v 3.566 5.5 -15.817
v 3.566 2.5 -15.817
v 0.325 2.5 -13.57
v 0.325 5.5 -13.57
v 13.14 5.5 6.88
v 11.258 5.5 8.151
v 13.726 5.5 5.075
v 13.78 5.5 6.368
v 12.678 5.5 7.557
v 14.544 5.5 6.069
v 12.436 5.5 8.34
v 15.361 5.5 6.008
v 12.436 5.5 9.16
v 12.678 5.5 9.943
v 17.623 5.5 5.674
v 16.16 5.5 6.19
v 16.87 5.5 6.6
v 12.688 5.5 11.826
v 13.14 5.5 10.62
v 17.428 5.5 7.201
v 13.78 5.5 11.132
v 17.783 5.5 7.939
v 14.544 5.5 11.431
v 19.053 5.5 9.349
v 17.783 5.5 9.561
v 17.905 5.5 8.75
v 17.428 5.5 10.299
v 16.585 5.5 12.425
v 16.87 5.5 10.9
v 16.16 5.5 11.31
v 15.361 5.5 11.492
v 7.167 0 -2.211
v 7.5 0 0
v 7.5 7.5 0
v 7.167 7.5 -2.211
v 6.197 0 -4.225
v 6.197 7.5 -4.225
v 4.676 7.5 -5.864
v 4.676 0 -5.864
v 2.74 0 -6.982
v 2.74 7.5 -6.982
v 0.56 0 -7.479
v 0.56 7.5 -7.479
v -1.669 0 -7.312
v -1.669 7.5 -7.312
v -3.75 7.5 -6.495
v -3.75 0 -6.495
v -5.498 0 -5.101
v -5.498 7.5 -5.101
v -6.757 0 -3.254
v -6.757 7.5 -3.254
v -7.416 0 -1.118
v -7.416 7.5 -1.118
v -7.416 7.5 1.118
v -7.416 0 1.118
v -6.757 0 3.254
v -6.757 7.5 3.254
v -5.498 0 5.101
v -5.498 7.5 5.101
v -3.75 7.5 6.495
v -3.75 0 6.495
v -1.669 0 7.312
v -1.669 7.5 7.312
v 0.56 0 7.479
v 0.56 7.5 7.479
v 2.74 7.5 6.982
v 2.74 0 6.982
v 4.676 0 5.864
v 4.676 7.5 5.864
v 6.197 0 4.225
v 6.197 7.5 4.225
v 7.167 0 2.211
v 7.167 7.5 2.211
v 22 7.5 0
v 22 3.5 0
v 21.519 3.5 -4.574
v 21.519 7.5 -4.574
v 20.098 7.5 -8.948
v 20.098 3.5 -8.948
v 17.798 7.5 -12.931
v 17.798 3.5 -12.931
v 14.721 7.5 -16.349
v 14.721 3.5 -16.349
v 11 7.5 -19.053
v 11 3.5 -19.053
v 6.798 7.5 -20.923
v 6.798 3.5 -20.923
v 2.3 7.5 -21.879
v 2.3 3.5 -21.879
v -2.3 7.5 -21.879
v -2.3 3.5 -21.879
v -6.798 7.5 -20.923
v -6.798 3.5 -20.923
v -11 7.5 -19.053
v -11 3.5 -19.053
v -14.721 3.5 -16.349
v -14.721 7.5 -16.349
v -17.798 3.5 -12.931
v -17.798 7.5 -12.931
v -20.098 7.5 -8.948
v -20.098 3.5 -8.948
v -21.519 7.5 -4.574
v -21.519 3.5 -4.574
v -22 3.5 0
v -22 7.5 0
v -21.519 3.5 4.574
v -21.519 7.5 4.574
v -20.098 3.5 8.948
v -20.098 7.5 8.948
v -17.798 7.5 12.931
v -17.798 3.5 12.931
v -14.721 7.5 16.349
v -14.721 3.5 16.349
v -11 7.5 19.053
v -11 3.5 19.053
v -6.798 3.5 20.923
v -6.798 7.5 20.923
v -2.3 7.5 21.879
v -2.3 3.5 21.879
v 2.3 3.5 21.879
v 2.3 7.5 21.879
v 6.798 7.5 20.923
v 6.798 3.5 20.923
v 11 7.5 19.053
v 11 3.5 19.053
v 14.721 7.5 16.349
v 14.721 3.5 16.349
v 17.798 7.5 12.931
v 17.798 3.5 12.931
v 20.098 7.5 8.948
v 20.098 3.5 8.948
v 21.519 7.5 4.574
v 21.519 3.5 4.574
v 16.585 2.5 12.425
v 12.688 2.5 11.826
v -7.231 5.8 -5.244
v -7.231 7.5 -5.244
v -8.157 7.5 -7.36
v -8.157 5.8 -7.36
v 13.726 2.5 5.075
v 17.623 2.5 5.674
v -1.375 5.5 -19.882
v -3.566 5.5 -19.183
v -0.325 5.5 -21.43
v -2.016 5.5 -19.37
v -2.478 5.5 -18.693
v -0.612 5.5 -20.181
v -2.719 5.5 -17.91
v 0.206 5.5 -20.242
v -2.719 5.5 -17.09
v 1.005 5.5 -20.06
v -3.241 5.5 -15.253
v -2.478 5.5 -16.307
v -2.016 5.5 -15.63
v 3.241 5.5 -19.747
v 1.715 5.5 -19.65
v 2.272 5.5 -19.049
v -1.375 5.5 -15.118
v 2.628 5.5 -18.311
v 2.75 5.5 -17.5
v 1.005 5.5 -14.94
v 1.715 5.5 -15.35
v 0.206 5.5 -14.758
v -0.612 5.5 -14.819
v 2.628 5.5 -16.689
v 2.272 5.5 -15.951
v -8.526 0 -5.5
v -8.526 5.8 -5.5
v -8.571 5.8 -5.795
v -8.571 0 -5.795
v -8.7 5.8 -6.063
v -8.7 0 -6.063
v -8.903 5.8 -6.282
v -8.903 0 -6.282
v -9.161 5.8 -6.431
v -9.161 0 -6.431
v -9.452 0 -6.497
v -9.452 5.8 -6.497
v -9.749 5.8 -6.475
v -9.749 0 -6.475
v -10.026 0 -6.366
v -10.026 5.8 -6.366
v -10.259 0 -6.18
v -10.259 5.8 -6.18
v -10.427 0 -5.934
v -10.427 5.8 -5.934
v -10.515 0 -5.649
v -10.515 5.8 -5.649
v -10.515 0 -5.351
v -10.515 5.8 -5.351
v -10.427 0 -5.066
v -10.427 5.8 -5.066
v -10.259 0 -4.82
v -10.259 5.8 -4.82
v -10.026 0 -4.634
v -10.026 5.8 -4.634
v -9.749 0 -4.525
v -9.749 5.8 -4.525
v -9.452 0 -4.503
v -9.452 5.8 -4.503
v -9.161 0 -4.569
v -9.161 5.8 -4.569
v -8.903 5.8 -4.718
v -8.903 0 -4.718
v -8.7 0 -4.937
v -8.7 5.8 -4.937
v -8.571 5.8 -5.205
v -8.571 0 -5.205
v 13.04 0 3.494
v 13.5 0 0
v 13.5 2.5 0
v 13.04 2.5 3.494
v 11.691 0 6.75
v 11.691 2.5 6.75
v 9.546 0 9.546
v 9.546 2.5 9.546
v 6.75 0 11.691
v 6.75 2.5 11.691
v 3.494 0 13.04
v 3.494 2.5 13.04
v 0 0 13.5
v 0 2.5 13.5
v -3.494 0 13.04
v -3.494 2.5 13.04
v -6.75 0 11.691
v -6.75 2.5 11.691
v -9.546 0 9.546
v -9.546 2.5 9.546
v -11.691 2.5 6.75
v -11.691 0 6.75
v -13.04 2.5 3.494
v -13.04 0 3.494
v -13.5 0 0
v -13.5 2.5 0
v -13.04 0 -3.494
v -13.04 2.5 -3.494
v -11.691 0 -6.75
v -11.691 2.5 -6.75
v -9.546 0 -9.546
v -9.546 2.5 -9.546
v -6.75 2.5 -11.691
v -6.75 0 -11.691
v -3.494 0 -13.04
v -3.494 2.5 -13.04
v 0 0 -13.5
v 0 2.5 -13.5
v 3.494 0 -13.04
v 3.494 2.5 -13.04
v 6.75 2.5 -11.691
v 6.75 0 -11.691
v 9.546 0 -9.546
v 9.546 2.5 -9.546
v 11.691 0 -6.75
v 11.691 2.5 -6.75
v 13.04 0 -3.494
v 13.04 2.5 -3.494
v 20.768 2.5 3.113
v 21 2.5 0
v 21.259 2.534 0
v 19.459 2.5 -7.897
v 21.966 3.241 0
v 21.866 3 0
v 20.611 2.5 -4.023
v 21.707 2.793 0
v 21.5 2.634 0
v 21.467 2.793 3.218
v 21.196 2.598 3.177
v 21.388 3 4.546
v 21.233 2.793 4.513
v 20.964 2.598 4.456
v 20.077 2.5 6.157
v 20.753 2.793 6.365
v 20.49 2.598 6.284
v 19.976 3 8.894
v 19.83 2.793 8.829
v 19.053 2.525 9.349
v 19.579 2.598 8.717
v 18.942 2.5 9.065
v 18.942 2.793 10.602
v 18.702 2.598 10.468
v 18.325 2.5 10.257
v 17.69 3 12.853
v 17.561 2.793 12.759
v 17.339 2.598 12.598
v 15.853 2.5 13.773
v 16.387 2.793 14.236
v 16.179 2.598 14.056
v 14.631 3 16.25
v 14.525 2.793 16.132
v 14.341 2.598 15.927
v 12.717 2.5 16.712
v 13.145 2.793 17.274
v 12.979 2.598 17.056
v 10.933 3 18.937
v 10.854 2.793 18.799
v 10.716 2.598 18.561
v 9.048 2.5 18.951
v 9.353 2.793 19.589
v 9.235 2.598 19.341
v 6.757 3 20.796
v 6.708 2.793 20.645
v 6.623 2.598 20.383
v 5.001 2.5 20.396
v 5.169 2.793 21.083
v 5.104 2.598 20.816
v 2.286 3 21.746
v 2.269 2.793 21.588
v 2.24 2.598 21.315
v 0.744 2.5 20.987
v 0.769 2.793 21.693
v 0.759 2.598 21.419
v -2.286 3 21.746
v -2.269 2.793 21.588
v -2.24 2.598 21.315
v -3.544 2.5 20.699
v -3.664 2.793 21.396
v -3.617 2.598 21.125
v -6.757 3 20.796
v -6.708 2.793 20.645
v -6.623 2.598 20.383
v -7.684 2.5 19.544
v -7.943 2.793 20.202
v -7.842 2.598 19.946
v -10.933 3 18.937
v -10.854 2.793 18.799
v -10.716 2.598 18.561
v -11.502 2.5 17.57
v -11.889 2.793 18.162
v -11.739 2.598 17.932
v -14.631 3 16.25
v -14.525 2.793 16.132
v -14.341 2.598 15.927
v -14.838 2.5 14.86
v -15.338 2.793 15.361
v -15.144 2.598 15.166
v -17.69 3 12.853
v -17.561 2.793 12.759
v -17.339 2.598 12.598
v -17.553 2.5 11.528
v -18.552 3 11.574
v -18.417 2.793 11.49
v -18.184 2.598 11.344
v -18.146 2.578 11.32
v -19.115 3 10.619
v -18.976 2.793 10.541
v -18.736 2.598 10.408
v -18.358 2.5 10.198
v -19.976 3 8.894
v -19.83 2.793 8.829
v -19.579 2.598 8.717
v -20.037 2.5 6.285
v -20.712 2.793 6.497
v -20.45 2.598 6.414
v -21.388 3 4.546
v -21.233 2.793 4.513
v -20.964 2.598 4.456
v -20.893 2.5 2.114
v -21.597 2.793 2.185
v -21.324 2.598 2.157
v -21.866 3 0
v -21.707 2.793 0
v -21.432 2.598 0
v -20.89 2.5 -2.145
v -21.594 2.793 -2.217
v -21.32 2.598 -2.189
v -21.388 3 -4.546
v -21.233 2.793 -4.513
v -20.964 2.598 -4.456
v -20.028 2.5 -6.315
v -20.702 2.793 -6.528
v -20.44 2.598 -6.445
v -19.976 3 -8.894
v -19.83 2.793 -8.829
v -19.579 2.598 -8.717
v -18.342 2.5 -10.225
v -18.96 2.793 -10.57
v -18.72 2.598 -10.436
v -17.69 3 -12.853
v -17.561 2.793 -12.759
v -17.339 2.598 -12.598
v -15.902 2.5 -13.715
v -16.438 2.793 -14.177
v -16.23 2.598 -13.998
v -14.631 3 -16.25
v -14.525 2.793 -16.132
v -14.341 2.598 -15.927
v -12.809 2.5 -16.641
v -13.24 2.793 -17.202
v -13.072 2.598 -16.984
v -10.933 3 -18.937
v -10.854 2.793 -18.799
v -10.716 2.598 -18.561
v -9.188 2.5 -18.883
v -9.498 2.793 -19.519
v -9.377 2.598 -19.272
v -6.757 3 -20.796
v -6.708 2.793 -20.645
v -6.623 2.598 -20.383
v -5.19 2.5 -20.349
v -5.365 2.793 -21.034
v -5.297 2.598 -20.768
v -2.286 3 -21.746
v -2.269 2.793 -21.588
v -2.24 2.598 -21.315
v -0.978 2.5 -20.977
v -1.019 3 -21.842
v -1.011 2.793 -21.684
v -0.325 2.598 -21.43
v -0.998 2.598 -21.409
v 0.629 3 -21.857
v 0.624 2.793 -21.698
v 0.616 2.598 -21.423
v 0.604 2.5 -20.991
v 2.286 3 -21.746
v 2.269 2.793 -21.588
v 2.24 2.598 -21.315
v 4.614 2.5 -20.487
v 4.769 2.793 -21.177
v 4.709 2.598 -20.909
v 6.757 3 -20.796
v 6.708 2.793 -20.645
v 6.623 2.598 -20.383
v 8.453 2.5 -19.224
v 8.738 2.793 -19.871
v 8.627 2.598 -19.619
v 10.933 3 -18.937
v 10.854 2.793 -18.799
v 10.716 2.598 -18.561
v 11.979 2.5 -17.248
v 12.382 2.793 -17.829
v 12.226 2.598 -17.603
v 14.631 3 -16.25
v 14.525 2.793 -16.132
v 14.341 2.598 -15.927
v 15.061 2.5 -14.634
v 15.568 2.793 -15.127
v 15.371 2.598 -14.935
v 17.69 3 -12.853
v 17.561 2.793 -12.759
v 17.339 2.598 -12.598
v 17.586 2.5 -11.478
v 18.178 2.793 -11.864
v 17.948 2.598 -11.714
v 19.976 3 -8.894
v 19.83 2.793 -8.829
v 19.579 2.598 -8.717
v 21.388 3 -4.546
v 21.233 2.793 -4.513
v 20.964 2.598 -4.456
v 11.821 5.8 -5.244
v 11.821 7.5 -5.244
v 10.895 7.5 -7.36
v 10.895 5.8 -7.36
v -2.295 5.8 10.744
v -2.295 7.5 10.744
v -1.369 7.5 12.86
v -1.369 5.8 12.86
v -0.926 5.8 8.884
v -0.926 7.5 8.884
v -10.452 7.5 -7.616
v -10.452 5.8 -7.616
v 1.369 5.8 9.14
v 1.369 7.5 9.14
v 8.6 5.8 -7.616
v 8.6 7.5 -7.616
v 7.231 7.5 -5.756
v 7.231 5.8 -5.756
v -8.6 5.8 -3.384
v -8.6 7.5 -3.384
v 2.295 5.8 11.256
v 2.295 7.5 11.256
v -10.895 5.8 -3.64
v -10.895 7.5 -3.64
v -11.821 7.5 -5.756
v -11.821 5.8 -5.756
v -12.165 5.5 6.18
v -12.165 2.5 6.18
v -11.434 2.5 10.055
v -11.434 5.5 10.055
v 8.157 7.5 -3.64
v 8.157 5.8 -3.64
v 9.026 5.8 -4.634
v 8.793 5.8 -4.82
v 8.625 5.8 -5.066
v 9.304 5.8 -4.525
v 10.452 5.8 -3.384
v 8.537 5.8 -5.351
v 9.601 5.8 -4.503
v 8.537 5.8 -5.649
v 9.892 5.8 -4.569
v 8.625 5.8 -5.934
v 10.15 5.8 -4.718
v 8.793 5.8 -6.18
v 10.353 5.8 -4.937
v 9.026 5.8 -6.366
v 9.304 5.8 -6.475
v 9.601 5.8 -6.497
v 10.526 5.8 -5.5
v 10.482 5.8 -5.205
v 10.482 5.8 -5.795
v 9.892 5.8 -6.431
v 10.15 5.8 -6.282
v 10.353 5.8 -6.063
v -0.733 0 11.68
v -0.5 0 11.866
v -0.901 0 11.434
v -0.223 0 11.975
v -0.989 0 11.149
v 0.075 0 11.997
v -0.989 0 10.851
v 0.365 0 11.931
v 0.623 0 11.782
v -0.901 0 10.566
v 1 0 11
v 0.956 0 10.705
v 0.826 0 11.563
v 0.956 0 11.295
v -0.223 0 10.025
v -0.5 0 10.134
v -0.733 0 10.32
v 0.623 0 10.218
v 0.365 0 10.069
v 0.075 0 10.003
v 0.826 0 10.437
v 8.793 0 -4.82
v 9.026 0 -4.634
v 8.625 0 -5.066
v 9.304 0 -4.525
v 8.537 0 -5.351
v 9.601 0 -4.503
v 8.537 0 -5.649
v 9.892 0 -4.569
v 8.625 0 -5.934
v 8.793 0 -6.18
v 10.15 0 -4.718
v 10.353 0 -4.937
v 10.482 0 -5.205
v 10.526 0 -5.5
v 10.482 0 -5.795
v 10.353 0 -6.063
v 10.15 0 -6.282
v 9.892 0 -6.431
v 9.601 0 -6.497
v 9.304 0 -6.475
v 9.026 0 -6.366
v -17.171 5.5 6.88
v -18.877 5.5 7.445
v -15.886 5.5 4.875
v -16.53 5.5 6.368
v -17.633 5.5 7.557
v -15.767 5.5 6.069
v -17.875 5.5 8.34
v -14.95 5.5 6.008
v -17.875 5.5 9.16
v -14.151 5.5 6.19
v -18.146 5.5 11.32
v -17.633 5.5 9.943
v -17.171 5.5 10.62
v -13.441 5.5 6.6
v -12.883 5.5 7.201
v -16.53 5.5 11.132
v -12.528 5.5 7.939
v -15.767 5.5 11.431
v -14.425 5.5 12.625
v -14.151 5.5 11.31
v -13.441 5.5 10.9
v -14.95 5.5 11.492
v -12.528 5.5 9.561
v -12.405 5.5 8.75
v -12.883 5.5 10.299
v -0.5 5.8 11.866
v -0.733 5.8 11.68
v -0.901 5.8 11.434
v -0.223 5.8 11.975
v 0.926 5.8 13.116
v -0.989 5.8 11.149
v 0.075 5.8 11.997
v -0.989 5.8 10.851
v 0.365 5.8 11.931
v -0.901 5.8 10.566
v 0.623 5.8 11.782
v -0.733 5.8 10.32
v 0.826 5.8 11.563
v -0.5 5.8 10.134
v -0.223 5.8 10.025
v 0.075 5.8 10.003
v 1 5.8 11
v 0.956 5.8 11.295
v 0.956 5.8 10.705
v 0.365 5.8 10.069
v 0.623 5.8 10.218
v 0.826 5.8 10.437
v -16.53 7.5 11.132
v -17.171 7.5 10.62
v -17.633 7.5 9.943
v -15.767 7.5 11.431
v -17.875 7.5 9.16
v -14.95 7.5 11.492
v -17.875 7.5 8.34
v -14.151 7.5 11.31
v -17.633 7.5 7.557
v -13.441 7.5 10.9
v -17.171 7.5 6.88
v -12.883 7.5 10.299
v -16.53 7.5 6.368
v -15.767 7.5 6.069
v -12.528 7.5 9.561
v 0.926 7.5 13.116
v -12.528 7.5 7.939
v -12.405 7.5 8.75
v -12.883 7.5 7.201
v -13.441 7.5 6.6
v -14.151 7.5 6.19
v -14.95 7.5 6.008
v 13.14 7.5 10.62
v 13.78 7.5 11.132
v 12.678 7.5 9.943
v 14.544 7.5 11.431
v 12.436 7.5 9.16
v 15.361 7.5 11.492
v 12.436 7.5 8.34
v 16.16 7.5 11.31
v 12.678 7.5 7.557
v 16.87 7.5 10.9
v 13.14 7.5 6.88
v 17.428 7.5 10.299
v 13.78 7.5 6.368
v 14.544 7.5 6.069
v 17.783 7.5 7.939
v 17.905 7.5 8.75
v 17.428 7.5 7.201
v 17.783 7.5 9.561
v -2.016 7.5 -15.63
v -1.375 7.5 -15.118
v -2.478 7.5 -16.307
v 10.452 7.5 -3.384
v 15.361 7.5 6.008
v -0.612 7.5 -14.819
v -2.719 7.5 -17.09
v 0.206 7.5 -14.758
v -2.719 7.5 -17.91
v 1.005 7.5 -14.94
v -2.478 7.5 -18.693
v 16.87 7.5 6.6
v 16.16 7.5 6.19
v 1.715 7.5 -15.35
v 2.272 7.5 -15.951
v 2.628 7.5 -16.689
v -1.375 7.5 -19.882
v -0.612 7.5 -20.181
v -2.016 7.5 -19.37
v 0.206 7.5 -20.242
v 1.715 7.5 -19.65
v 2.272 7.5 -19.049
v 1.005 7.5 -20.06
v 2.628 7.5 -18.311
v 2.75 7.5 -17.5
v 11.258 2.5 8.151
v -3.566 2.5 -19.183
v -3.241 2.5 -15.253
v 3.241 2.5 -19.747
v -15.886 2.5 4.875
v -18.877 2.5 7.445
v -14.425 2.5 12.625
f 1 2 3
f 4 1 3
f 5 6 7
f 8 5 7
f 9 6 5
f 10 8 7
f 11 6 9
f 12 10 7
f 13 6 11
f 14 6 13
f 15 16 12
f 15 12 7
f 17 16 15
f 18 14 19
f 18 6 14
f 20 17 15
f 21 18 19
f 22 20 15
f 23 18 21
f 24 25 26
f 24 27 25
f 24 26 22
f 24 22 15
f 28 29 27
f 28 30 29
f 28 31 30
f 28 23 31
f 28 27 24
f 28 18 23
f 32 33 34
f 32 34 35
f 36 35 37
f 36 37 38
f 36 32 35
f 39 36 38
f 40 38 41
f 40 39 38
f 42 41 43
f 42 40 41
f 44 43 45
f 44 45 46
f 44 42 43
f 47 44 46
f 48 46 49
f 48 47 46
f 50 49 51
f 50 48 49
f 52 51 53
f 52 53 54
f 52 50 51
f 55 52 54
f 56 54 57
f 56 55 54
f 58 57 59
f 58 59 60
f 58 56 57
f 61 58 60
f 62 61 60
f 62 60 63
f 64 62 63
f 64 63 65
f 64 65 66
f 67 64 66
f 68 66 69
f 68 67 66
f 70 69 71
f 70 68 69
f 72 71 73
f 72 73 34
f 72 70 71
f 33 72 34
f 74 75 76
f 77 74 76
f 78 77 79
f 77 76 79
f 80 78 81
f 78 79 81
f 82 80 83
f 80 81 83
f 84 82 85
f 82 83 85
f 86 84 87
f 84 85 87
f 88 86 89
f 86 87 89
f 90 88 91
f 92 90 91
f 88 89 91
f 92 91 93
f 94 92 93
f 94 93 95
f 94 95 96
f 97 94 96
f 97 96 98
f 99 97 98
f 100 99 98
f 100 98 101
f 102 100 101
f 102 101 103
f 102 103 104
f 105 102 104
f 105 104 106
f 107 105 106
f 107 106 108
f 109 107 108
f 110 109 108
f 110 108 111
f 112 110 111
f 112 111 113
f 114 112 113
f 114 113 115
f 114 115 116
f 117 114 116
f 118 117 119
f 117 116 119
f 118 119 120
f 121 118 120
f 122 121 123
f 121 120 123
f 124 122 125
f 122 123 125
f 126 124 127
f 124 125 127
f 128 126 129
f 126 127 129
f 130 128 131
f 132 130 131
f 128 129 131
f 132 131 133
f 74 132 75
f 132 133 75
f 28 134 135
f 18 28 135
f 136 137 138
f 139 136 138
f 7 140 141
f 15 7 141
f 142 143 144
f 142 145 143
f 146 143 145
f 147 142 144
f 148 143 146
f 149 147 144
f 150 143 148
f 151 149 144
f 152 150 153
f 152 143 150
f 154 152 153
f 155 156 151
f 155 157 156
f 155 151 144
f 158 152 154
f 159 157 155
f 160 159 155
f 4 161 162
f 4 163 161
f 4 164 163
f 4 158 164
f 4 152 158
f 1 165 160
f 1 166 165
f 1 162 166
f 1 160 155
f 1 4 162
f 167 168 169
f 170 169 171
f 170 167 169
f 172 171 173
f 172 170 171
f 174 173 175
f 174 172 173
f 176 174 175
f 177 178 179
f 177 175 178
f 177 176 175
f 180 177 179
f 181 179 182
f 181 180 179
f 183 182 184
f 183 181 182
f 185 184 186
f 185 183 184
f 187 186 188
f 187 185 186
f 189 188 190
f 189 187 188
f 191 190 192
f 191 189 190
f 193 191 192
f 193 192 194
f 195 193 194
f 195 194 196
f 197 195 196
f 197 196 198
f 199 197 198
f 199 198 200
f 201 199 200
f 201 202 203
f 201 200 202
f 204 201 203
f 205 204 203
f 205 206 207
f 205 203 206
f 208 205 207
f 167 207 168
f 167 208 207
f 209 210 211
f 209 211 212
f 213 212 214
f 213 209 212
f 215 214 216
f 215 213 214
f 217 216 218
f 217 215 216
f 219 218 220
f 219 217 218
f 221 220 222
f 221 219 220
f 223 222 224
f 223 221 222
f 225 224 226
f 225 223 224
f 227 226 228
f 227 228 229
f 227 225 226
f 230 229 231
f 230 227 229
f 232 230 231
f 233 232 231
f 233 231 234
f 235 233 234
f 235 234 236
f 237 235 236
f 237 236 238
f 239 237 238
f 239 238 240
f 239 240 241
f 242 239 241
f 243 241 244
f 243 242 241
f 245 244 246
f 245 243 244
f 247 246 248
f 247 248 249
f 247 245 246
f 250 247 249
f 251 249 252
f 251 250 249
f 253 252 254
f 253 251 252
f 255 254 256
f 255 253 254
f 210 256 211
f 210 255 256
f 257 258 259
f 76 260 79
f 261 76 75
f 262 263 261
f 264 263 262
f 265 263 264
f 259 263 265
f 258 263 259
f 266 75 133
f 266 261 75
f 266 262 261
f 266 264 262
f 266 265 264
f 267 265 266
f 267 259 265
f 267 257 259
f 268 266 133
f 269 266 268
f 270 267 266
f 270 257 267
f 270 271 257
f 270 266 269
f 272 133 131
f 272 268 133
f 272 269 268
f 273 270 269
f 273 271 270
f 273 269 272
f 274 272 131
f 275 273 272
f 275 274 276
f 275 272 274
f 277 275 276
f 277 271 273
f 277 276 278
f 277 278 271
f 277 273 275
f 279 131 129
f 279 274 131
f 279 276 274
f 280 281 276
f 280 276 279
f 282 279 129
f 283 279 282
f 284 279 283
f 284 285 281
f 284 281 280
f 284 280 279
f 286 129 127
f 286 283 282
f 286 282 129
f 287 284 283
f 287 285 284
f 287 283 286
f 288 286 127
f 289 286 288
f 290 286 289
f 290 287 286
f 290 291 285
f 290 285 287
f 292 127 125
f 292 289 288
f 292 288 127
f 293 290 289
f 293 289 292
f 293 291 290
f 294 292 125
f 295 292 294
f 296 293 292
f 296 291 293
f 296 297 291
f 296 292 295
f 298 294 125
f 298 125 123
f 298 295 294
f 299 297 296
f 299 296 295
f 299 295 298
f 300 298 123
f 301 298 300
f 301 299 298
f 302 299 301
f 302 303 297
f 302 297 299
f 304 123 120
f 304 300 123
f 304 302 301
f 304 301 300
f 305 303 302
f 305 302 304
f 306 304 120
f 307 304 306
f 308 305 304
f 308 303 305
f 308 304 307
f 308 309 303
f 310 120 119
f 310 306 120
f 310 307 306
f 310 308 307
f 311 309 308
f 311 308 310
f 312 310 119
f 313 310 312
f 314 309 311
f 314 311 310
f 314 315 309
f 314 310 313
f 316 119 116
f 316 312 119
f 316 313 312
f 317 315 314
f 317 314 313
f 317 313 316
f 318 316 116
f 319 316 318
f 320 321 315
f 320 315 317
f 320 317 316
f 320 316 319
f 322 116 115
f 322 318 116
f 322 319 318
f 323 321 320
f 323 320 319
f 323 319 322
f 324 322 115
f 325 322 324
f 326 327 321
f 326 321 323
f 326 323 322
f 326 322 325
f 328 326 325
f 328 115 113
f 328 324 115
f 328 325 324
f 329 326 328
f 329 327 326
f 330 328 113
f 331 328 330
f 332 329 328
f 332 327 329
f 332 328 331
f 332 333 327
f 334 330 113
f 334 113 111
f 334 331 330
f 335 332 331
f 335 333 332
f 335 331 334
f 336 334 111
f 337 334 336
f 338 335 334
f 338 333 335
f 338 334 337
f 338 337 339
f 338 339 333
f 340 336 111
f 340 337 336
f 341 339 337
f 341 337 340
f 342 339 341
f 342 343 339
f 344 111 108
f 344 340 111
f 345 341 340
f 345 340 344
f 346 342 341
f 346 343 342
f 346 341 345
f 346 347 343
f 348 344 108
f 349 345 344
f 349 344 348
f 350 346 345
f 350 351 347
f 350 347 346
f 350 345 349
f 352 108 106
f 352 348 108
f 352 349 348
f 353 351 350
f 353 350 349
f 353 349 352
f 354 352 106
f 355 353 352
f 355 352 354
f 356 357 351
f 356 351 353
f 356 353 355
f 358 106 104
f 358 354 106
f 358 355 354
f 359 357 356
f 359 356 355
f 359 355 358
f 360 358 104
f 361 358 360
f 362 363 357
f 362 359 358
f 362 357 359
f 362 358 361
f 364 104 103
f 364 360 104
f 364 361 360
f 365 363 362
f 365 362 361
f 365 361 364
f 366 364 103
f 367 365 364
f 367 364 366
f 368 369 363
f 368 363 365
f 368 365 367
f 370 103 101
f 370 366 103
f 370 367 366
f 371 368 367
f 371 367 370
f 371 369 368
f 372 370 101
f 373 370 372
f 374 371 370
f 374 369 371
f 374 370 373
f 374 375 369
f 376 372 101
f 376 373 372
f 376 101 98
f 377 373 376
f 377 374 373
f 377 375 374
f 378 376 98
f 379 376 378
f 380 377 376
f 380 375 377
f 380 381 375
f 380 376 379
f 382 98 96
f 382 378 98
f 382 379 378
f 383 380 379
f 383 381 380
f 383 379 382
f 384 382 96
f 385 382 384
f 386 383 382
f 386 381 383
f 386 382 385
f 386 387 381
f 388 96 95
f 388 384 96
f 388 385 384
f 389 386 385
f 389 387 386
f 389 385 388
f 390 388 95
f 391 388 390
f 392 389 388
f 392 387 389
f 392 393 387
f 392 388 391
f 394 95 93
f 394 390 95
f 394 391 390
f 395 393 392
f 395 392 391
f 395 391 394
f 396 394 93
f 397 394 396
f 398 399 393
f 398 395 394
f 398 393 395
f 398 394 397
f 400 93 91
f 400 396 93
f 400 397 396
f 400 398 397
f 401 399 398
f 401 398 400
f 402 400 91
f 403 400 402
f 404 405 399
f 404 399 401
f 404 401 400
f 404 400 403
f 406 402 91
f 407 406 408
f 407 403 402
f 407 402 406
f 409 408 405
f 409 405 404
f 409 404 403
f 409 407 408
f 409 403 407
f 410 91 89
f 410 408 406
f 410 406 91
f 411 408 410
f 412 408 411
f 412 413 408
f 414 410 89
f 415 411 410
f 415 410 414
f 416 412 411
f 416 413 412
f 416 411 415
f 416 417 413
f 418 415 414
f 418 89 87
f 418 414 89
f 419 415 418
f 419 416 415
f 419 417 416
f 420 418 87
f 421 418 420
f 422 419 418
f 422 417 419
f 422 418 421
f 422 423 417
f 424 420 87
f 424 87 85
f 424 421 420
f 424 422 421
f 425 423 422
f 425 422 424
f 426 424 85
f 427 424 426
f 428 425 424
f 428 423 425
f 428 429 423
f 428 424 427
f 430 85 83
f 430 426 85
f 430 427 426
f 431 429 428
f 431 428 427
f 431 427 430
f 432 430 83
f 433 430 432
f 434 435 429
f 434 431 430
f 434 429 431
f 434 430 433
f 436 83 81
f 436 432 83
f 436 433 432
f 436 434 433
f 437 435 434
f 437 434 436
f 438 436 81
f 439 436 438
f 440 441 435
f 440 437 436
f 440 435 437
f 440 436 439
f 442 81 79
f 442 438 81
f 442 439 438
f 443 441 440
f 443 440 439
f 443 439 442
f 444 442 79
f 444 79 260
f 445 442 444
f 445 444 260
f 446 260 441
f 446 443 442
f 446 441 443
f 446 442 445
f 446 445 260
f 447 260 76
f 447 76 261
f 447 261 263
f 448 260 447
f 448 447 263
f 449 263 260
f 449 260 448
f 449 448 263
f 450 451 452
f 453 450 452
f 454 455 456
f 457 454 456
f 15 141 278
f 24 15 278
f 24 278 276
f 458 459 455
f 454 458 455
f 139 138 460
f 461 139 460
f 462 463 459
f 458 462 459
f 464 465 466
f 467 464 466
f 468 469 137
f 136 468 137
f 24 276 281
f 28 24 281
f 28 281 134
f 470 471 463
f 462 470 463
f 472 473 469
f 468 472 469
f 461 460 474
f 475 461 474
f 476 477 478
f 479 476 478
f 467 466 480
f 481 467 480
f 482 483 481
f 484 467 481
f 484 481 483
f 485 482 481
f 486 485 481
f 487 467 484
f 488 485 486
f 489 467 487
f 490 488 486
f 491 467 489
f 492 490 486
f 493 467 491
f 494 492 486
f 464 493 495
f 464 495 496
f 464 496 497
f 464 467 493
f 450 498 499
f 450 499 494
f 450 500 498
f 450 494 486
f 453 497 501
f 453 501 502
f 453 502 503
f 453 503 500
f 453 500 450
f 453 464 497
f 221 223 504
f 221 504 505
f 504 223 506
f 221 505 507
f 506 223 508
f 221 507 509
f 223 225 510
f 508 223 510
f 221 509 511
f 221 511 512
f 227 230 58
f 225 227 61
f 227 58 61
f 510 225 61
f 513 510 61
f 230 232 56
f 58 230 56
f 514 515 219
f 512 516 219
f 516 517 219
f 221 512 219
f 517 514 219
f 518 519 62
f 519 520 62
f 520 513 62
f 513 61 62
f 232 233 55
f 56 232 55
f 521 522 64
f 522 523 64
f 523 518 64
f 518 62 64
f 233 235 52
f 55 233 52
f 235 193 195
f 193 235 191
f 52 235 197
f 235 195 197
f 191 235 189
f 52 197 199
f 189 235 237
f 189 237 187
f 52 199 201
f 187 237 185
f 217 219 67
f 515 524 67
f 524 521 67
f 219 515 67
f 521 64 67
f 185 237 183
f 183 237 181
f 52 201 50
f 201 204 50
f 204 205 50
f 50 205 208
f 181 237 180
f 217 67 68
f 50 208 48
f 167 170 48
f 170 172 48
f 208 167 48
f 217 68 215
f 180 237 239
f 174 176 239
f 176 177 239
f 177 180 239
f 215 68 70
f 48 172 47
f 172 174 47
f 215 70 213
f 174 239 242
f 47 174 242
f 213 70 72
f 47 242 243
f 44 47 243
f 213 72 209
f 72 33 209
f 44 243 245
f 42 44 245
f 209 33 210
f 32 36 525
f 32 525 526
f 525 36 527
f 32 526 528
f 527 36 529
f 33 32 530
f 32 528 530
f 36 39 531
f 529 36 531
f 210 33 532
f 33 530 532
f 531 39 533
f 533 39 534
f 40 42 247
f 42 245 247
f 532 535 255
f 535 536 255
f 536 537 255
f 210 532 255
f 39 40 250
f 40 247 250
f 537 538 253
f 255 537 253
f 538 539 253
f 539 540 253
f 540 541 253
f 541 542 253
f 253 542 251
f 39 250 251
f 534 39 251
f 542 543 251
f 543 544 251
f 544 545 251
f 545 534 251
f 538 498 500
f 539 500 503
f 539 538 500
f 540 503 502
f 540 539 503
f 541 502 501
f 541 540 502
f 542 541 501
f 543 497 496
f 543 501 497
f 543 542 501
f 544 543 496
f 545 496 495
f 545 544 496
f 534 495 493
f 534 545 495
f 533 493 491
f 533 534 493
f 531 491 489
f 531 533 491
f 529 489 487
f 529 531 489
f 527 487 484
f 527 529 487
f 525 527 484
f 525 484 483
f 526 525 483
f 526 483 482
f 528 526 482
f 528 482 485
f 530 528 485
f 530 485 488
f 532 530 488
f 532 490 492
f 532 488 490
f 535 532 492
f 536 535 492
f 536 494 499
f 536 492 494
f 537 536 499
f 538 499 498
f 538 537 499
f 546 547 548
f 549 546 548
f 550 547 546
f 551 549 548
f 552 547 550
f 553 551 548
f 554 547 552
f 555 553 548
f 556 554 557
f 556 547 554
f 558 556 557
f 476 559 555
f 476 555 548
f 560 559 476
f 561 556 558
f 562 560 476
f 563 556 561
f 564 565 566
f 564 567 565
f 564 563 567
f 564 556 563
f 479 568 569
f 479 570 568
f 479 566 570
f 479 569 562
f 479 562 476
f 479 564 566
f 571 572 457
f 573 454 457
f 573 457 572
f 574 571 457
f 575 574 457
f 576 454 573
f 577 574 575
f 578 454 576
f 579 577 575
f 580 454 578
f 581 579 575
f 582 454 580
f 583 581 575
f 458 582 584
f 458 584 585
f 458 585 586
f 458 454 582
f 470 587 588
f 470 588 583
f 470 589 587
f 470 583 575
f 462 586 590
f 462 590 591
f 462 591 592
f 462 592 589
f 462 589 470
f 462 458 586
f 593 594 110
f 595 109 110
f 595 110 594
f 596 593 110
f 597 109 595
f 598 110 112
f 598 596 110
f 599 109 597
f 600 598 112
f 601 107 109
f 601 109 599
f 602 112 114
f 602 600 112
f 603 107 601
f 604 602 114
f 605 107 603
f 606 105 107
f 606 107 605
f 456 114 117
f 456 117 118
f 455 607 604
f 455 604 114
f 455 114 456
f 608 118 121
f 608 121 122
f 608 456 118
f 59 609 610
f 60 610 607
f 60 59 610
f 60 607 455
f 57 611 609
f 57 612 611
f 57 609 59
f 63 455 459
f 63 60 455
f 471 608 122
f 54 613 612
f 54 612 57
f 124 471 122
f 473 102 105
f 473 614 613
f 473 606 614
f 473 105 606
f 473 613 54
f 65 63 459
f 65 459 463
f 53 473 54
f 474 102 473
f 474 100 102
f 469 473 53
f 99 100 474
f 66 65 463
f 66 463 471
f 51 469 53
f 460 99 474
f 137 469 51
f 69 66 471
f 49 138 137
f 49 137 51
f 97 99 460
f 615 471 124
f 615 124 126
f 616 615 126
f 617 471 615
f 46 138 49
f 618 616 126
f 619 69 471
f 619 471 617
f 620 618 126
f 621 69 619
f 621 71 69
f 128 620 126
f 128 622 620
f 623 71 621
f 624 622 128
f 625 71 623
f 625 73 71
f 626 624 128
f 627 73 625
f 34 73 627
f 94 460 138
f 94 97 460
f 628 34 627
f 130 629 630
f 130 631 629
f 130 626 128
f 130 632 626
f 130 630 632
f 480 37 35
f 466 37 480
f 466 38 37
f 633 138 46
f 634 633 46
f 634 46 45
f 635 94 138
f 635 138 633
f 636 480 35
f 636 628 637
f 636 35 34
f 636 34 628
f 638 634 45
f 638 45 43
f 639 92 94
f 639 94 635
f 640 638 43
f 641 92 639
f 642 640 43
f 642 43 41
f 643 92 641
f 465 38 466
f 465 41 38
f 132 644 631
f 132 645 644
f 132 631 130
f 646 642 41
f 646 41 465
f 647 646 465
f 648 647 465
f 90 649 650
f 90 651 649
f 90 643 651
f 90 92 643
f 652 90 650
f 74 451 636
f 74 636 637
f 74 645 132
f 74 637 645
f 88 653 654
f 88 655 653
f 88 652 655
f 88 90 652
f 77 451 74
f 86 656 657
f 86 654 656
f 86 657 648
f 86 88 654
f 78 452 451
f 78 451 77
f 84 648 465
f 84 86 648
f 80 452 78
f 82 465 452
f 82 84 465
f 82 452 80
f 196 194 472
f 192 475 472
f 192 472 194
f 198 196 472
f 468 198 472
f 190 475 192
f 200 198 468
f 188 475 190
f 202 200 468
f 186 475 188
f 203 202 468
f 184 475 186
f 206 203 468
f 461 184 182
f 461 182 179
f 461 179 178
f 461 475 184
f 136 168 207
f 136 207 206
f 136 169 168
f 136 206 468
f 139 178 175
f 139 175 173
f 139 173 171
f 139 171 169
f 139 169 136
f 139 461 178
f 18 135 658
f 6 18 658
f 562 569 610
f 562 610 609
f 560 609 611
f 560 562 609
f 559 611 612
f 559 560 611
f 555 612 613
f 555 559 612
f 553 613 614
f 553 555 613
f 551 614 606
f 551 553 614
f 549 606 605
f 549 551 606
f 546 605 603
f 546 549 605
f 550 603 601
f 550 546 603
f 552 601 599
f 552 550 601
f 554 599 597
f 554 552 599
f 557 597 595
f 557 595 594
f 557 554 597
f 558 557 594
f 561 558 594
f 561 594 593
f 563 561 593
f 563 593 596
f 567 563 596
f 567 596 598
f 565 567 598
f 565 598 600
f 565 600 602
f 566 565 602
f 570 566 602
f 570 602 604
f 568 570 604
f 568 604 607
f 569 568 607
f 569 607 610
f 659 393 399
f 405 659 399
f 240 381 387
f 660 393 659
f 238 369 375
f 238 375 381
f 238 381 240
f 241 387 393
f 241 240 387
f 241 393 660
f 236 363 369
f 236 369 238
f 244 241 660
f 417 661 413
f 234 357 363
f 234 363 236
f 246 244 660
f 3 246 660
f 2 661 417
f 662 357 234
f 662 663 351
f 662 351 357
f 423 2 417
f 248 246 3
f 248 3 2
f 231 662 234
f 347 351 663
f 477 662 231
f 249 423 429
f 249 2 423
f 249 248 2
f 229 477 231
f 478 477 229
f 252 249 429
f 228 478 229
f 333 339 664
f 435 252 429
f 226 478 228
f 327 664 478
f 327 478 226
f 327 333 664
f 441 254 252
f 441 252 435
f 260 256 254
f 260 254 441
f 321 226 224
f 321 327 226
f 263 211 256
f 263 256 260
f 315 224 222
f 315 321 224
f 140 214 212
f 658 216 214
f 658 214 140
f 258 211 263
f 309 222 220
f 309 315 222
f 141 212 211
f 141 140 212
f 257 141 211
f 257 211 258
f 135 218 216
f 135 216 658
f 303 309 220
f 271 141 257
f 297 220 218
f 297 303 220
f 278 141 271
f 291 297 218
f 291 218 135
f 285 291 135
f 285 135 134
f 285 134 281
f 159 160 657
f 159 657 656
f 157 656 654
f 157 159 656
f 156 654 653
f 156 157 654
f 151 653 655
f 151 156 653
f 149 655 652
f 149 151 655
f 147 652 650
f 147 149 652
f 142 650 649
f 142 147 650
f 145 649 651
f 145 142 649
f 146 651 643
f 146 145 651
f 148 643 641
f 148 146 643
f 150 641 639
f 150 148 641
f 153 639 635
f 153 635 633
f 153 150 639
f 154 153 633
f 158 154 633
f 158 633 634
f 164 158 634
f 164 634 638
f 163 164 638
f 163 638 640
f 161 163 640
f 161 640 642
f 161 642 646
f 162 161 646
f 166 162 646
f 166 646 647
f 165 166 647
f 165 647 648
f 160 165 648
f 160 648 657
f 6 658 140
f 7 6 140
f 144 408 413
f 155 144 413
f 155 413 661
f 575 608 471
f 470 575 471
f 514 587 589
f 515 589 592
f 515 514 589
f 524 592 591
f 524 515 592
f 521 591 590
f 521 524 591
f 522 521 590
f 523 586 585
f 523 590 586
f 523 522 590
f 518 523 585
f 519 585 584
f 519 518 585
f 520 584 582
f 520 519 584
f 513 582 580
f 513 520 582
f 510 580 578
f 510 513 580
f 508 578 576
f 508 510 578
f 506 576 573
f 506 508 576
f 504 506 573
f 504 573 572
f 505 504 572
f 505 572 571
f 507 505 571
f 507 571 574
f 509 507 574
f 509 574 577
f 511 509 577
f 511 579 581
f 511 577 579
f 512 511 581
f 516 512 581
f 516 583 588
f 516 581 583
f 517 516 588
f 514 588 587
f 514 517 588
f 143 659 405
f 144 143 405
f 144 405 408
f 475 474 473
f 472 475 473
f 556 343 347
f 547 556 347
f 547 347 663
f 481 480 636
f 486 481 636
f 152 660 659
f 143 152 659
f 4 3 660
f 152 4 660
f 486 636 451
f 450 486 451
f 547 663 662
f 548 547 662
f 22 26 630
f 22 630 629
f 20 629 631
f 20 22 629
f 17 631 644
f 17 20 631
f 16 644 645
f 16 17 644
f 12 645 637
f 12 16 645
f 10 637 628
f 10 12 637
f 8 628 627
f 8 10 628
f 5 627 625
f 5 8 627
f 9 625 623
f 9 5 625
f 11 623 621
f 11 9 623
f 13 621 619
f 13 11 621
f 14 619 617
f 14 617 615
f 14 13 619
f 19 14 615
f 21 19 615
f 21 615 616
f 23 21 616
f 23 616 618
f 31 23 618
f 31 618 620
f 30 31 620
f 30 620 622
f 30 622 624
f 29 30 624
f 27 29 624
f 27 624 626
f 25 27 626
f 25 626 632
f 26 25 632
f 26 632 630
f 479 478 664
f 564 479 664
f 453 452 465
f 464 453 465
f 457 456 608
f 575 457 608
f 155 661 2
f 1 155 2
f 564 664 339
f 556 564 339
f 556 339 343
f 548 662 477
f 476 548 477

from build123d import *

# Parameters (mm, degrees)
SKETCH1_R           = 22
SKETCH1_R_2         = 2.75
SKETCH1_R_3         = 7.5
SKETCH1_R_4         = 1
BOSS_EXTRUDE1_DEPTH = 7.5
SKETCH2_R           = 22
SKETCH2_R_2         = 13.5
CUT_EXTRUDE1_DEPTH  = 2.5
FILLET2_R           = 1
CUT_EXTRUDE2_DEPTH  = 1.7
CUT_EXTRUDE3_DEPTH  = 3


with BuildPart() as part:
    # Sketch1 → Boss-Extrude1 (new body)
    with BuildSketch(Plane(origin=(0, 0, 0), x_dir=(1, 0, 0), z_dir=(0, 1, 0))):
        Circle(SKETCH1_R)
        with Locations((0, 17.5)):
            Circle(SKETCH1_R_2, mode=Mode.SUBTRACT)
        with Locations((-15.155444566, -8.75)):
            Circle(SKETCH1_R_2, mode=Mode.SUBTRACT)
        with Locations((15.155444566, -8.75)):
            Circle(SKETCH1_R_2, mode=Mode.SUBTRACT)
        Circle(SKETCH1_R_3, mode=Mode.SUBTRACT)
        with Locations((-9.526279442, 5.5)):
            Circle(SKETCH1_R_4, mode=Mode.SUBTRACT)
        with Locations((9.526279442, 5.5)):
            Circle(SKETCH1_R_4, mode=Mode.SUBTRACT)
        with Locations((0, -11)):
            Circle(SKETCH1_R_4, mode=Mode.SUBTRACT)
    extrude(amount=BOSS_EXTRUDE1_DEPTH)

    # Sketch2 → Cut-Extrude1 (cut)
    with BuildSketch(Plane.XZ):
        Circle(SKETCH2_R)
        Circle(SKETCH2_R_2, mode=Mode.SUBTRACT)
    extrude(amount=-CUT_EXTRUDE1_DEPTH, mode=Mode.SUBTRACT)

    # Fillet2
    fillet2_edges = [part.edges().sort_by_distance(p)[0] for p in [
        (-22, 2.5, 0),
    ]]
    fillet(fillet2_edges, radius=FILLET2_R)

    # Sketch4 → Cut-Extrude2 (cut)
    with BuildSketch(Plane(origin=(0, 7.5, 0), x_dir=(1, 0, 0), z_dir=(0, 1, 0))):
        Polygon((8.157191191, 3.640179929), (10.452386744, 3.384424759), (11.821474995, 5.24424483), (10.895367692, 7.359820071), (8.600172139, 7.615575241), (7.231083889, 5.75575517), align=None)
        Polygon((-1.369088251, -12.859820071), (0.926107302, -13.115575241), (2.295195553, -11.25575517), (1.369088251, -9.140179929), (-0.926107302, -8.884424759), (-2.295195553, -10.74424483), align=None)
        Polygon((-10.895367692, 3.640179929), (-8.600172139, 3.384424759), (-7.231083889, 5.24424483), (-8.157191191, 7.359820071), (-10.452386744, 7.615575241), (-11.821474995, 5.75575517), align=None)
    extrude(amount=-CUT_EXTRUDE2_DEPTH, mode=Mode.SUBTRACT)

    # Sketch5 → Cut-Extrude3 (cut)
    with BuildSketch(Plane.XZ.offset(-2.5)):
        Polygon((12.687667108, 11.82566379), (11.257952861, 8.150673926), (13.725730319, 5.075010135), (17.623222024, 5.67433621), (19.052936271, 9.349326074), (16.585158813, 12.424989865), align=None)
        Polygon((-18.145928854, 11.320337927), (-18.876664651, 7.445333601), (-15.886180363, 4.874995674), (-12.164960279, 6.179662073), (-11.434224481, 10.054666399), (-14.424708769, 12.625004326), align=None)
        Polygon((-3.240770937, -15.253438836), (-3.565964508, -19.183309377), (-0.325193571, -21.429870542), (3.240770937, -19.746561164), (3.565964508, -15.816690623), (0.325193571, -13.570129458), align=None)
    extrude(amount=-CUT_EXTRUDE3_DEPTH, mode=Mode.SUBTRACT)


solid = part.part
